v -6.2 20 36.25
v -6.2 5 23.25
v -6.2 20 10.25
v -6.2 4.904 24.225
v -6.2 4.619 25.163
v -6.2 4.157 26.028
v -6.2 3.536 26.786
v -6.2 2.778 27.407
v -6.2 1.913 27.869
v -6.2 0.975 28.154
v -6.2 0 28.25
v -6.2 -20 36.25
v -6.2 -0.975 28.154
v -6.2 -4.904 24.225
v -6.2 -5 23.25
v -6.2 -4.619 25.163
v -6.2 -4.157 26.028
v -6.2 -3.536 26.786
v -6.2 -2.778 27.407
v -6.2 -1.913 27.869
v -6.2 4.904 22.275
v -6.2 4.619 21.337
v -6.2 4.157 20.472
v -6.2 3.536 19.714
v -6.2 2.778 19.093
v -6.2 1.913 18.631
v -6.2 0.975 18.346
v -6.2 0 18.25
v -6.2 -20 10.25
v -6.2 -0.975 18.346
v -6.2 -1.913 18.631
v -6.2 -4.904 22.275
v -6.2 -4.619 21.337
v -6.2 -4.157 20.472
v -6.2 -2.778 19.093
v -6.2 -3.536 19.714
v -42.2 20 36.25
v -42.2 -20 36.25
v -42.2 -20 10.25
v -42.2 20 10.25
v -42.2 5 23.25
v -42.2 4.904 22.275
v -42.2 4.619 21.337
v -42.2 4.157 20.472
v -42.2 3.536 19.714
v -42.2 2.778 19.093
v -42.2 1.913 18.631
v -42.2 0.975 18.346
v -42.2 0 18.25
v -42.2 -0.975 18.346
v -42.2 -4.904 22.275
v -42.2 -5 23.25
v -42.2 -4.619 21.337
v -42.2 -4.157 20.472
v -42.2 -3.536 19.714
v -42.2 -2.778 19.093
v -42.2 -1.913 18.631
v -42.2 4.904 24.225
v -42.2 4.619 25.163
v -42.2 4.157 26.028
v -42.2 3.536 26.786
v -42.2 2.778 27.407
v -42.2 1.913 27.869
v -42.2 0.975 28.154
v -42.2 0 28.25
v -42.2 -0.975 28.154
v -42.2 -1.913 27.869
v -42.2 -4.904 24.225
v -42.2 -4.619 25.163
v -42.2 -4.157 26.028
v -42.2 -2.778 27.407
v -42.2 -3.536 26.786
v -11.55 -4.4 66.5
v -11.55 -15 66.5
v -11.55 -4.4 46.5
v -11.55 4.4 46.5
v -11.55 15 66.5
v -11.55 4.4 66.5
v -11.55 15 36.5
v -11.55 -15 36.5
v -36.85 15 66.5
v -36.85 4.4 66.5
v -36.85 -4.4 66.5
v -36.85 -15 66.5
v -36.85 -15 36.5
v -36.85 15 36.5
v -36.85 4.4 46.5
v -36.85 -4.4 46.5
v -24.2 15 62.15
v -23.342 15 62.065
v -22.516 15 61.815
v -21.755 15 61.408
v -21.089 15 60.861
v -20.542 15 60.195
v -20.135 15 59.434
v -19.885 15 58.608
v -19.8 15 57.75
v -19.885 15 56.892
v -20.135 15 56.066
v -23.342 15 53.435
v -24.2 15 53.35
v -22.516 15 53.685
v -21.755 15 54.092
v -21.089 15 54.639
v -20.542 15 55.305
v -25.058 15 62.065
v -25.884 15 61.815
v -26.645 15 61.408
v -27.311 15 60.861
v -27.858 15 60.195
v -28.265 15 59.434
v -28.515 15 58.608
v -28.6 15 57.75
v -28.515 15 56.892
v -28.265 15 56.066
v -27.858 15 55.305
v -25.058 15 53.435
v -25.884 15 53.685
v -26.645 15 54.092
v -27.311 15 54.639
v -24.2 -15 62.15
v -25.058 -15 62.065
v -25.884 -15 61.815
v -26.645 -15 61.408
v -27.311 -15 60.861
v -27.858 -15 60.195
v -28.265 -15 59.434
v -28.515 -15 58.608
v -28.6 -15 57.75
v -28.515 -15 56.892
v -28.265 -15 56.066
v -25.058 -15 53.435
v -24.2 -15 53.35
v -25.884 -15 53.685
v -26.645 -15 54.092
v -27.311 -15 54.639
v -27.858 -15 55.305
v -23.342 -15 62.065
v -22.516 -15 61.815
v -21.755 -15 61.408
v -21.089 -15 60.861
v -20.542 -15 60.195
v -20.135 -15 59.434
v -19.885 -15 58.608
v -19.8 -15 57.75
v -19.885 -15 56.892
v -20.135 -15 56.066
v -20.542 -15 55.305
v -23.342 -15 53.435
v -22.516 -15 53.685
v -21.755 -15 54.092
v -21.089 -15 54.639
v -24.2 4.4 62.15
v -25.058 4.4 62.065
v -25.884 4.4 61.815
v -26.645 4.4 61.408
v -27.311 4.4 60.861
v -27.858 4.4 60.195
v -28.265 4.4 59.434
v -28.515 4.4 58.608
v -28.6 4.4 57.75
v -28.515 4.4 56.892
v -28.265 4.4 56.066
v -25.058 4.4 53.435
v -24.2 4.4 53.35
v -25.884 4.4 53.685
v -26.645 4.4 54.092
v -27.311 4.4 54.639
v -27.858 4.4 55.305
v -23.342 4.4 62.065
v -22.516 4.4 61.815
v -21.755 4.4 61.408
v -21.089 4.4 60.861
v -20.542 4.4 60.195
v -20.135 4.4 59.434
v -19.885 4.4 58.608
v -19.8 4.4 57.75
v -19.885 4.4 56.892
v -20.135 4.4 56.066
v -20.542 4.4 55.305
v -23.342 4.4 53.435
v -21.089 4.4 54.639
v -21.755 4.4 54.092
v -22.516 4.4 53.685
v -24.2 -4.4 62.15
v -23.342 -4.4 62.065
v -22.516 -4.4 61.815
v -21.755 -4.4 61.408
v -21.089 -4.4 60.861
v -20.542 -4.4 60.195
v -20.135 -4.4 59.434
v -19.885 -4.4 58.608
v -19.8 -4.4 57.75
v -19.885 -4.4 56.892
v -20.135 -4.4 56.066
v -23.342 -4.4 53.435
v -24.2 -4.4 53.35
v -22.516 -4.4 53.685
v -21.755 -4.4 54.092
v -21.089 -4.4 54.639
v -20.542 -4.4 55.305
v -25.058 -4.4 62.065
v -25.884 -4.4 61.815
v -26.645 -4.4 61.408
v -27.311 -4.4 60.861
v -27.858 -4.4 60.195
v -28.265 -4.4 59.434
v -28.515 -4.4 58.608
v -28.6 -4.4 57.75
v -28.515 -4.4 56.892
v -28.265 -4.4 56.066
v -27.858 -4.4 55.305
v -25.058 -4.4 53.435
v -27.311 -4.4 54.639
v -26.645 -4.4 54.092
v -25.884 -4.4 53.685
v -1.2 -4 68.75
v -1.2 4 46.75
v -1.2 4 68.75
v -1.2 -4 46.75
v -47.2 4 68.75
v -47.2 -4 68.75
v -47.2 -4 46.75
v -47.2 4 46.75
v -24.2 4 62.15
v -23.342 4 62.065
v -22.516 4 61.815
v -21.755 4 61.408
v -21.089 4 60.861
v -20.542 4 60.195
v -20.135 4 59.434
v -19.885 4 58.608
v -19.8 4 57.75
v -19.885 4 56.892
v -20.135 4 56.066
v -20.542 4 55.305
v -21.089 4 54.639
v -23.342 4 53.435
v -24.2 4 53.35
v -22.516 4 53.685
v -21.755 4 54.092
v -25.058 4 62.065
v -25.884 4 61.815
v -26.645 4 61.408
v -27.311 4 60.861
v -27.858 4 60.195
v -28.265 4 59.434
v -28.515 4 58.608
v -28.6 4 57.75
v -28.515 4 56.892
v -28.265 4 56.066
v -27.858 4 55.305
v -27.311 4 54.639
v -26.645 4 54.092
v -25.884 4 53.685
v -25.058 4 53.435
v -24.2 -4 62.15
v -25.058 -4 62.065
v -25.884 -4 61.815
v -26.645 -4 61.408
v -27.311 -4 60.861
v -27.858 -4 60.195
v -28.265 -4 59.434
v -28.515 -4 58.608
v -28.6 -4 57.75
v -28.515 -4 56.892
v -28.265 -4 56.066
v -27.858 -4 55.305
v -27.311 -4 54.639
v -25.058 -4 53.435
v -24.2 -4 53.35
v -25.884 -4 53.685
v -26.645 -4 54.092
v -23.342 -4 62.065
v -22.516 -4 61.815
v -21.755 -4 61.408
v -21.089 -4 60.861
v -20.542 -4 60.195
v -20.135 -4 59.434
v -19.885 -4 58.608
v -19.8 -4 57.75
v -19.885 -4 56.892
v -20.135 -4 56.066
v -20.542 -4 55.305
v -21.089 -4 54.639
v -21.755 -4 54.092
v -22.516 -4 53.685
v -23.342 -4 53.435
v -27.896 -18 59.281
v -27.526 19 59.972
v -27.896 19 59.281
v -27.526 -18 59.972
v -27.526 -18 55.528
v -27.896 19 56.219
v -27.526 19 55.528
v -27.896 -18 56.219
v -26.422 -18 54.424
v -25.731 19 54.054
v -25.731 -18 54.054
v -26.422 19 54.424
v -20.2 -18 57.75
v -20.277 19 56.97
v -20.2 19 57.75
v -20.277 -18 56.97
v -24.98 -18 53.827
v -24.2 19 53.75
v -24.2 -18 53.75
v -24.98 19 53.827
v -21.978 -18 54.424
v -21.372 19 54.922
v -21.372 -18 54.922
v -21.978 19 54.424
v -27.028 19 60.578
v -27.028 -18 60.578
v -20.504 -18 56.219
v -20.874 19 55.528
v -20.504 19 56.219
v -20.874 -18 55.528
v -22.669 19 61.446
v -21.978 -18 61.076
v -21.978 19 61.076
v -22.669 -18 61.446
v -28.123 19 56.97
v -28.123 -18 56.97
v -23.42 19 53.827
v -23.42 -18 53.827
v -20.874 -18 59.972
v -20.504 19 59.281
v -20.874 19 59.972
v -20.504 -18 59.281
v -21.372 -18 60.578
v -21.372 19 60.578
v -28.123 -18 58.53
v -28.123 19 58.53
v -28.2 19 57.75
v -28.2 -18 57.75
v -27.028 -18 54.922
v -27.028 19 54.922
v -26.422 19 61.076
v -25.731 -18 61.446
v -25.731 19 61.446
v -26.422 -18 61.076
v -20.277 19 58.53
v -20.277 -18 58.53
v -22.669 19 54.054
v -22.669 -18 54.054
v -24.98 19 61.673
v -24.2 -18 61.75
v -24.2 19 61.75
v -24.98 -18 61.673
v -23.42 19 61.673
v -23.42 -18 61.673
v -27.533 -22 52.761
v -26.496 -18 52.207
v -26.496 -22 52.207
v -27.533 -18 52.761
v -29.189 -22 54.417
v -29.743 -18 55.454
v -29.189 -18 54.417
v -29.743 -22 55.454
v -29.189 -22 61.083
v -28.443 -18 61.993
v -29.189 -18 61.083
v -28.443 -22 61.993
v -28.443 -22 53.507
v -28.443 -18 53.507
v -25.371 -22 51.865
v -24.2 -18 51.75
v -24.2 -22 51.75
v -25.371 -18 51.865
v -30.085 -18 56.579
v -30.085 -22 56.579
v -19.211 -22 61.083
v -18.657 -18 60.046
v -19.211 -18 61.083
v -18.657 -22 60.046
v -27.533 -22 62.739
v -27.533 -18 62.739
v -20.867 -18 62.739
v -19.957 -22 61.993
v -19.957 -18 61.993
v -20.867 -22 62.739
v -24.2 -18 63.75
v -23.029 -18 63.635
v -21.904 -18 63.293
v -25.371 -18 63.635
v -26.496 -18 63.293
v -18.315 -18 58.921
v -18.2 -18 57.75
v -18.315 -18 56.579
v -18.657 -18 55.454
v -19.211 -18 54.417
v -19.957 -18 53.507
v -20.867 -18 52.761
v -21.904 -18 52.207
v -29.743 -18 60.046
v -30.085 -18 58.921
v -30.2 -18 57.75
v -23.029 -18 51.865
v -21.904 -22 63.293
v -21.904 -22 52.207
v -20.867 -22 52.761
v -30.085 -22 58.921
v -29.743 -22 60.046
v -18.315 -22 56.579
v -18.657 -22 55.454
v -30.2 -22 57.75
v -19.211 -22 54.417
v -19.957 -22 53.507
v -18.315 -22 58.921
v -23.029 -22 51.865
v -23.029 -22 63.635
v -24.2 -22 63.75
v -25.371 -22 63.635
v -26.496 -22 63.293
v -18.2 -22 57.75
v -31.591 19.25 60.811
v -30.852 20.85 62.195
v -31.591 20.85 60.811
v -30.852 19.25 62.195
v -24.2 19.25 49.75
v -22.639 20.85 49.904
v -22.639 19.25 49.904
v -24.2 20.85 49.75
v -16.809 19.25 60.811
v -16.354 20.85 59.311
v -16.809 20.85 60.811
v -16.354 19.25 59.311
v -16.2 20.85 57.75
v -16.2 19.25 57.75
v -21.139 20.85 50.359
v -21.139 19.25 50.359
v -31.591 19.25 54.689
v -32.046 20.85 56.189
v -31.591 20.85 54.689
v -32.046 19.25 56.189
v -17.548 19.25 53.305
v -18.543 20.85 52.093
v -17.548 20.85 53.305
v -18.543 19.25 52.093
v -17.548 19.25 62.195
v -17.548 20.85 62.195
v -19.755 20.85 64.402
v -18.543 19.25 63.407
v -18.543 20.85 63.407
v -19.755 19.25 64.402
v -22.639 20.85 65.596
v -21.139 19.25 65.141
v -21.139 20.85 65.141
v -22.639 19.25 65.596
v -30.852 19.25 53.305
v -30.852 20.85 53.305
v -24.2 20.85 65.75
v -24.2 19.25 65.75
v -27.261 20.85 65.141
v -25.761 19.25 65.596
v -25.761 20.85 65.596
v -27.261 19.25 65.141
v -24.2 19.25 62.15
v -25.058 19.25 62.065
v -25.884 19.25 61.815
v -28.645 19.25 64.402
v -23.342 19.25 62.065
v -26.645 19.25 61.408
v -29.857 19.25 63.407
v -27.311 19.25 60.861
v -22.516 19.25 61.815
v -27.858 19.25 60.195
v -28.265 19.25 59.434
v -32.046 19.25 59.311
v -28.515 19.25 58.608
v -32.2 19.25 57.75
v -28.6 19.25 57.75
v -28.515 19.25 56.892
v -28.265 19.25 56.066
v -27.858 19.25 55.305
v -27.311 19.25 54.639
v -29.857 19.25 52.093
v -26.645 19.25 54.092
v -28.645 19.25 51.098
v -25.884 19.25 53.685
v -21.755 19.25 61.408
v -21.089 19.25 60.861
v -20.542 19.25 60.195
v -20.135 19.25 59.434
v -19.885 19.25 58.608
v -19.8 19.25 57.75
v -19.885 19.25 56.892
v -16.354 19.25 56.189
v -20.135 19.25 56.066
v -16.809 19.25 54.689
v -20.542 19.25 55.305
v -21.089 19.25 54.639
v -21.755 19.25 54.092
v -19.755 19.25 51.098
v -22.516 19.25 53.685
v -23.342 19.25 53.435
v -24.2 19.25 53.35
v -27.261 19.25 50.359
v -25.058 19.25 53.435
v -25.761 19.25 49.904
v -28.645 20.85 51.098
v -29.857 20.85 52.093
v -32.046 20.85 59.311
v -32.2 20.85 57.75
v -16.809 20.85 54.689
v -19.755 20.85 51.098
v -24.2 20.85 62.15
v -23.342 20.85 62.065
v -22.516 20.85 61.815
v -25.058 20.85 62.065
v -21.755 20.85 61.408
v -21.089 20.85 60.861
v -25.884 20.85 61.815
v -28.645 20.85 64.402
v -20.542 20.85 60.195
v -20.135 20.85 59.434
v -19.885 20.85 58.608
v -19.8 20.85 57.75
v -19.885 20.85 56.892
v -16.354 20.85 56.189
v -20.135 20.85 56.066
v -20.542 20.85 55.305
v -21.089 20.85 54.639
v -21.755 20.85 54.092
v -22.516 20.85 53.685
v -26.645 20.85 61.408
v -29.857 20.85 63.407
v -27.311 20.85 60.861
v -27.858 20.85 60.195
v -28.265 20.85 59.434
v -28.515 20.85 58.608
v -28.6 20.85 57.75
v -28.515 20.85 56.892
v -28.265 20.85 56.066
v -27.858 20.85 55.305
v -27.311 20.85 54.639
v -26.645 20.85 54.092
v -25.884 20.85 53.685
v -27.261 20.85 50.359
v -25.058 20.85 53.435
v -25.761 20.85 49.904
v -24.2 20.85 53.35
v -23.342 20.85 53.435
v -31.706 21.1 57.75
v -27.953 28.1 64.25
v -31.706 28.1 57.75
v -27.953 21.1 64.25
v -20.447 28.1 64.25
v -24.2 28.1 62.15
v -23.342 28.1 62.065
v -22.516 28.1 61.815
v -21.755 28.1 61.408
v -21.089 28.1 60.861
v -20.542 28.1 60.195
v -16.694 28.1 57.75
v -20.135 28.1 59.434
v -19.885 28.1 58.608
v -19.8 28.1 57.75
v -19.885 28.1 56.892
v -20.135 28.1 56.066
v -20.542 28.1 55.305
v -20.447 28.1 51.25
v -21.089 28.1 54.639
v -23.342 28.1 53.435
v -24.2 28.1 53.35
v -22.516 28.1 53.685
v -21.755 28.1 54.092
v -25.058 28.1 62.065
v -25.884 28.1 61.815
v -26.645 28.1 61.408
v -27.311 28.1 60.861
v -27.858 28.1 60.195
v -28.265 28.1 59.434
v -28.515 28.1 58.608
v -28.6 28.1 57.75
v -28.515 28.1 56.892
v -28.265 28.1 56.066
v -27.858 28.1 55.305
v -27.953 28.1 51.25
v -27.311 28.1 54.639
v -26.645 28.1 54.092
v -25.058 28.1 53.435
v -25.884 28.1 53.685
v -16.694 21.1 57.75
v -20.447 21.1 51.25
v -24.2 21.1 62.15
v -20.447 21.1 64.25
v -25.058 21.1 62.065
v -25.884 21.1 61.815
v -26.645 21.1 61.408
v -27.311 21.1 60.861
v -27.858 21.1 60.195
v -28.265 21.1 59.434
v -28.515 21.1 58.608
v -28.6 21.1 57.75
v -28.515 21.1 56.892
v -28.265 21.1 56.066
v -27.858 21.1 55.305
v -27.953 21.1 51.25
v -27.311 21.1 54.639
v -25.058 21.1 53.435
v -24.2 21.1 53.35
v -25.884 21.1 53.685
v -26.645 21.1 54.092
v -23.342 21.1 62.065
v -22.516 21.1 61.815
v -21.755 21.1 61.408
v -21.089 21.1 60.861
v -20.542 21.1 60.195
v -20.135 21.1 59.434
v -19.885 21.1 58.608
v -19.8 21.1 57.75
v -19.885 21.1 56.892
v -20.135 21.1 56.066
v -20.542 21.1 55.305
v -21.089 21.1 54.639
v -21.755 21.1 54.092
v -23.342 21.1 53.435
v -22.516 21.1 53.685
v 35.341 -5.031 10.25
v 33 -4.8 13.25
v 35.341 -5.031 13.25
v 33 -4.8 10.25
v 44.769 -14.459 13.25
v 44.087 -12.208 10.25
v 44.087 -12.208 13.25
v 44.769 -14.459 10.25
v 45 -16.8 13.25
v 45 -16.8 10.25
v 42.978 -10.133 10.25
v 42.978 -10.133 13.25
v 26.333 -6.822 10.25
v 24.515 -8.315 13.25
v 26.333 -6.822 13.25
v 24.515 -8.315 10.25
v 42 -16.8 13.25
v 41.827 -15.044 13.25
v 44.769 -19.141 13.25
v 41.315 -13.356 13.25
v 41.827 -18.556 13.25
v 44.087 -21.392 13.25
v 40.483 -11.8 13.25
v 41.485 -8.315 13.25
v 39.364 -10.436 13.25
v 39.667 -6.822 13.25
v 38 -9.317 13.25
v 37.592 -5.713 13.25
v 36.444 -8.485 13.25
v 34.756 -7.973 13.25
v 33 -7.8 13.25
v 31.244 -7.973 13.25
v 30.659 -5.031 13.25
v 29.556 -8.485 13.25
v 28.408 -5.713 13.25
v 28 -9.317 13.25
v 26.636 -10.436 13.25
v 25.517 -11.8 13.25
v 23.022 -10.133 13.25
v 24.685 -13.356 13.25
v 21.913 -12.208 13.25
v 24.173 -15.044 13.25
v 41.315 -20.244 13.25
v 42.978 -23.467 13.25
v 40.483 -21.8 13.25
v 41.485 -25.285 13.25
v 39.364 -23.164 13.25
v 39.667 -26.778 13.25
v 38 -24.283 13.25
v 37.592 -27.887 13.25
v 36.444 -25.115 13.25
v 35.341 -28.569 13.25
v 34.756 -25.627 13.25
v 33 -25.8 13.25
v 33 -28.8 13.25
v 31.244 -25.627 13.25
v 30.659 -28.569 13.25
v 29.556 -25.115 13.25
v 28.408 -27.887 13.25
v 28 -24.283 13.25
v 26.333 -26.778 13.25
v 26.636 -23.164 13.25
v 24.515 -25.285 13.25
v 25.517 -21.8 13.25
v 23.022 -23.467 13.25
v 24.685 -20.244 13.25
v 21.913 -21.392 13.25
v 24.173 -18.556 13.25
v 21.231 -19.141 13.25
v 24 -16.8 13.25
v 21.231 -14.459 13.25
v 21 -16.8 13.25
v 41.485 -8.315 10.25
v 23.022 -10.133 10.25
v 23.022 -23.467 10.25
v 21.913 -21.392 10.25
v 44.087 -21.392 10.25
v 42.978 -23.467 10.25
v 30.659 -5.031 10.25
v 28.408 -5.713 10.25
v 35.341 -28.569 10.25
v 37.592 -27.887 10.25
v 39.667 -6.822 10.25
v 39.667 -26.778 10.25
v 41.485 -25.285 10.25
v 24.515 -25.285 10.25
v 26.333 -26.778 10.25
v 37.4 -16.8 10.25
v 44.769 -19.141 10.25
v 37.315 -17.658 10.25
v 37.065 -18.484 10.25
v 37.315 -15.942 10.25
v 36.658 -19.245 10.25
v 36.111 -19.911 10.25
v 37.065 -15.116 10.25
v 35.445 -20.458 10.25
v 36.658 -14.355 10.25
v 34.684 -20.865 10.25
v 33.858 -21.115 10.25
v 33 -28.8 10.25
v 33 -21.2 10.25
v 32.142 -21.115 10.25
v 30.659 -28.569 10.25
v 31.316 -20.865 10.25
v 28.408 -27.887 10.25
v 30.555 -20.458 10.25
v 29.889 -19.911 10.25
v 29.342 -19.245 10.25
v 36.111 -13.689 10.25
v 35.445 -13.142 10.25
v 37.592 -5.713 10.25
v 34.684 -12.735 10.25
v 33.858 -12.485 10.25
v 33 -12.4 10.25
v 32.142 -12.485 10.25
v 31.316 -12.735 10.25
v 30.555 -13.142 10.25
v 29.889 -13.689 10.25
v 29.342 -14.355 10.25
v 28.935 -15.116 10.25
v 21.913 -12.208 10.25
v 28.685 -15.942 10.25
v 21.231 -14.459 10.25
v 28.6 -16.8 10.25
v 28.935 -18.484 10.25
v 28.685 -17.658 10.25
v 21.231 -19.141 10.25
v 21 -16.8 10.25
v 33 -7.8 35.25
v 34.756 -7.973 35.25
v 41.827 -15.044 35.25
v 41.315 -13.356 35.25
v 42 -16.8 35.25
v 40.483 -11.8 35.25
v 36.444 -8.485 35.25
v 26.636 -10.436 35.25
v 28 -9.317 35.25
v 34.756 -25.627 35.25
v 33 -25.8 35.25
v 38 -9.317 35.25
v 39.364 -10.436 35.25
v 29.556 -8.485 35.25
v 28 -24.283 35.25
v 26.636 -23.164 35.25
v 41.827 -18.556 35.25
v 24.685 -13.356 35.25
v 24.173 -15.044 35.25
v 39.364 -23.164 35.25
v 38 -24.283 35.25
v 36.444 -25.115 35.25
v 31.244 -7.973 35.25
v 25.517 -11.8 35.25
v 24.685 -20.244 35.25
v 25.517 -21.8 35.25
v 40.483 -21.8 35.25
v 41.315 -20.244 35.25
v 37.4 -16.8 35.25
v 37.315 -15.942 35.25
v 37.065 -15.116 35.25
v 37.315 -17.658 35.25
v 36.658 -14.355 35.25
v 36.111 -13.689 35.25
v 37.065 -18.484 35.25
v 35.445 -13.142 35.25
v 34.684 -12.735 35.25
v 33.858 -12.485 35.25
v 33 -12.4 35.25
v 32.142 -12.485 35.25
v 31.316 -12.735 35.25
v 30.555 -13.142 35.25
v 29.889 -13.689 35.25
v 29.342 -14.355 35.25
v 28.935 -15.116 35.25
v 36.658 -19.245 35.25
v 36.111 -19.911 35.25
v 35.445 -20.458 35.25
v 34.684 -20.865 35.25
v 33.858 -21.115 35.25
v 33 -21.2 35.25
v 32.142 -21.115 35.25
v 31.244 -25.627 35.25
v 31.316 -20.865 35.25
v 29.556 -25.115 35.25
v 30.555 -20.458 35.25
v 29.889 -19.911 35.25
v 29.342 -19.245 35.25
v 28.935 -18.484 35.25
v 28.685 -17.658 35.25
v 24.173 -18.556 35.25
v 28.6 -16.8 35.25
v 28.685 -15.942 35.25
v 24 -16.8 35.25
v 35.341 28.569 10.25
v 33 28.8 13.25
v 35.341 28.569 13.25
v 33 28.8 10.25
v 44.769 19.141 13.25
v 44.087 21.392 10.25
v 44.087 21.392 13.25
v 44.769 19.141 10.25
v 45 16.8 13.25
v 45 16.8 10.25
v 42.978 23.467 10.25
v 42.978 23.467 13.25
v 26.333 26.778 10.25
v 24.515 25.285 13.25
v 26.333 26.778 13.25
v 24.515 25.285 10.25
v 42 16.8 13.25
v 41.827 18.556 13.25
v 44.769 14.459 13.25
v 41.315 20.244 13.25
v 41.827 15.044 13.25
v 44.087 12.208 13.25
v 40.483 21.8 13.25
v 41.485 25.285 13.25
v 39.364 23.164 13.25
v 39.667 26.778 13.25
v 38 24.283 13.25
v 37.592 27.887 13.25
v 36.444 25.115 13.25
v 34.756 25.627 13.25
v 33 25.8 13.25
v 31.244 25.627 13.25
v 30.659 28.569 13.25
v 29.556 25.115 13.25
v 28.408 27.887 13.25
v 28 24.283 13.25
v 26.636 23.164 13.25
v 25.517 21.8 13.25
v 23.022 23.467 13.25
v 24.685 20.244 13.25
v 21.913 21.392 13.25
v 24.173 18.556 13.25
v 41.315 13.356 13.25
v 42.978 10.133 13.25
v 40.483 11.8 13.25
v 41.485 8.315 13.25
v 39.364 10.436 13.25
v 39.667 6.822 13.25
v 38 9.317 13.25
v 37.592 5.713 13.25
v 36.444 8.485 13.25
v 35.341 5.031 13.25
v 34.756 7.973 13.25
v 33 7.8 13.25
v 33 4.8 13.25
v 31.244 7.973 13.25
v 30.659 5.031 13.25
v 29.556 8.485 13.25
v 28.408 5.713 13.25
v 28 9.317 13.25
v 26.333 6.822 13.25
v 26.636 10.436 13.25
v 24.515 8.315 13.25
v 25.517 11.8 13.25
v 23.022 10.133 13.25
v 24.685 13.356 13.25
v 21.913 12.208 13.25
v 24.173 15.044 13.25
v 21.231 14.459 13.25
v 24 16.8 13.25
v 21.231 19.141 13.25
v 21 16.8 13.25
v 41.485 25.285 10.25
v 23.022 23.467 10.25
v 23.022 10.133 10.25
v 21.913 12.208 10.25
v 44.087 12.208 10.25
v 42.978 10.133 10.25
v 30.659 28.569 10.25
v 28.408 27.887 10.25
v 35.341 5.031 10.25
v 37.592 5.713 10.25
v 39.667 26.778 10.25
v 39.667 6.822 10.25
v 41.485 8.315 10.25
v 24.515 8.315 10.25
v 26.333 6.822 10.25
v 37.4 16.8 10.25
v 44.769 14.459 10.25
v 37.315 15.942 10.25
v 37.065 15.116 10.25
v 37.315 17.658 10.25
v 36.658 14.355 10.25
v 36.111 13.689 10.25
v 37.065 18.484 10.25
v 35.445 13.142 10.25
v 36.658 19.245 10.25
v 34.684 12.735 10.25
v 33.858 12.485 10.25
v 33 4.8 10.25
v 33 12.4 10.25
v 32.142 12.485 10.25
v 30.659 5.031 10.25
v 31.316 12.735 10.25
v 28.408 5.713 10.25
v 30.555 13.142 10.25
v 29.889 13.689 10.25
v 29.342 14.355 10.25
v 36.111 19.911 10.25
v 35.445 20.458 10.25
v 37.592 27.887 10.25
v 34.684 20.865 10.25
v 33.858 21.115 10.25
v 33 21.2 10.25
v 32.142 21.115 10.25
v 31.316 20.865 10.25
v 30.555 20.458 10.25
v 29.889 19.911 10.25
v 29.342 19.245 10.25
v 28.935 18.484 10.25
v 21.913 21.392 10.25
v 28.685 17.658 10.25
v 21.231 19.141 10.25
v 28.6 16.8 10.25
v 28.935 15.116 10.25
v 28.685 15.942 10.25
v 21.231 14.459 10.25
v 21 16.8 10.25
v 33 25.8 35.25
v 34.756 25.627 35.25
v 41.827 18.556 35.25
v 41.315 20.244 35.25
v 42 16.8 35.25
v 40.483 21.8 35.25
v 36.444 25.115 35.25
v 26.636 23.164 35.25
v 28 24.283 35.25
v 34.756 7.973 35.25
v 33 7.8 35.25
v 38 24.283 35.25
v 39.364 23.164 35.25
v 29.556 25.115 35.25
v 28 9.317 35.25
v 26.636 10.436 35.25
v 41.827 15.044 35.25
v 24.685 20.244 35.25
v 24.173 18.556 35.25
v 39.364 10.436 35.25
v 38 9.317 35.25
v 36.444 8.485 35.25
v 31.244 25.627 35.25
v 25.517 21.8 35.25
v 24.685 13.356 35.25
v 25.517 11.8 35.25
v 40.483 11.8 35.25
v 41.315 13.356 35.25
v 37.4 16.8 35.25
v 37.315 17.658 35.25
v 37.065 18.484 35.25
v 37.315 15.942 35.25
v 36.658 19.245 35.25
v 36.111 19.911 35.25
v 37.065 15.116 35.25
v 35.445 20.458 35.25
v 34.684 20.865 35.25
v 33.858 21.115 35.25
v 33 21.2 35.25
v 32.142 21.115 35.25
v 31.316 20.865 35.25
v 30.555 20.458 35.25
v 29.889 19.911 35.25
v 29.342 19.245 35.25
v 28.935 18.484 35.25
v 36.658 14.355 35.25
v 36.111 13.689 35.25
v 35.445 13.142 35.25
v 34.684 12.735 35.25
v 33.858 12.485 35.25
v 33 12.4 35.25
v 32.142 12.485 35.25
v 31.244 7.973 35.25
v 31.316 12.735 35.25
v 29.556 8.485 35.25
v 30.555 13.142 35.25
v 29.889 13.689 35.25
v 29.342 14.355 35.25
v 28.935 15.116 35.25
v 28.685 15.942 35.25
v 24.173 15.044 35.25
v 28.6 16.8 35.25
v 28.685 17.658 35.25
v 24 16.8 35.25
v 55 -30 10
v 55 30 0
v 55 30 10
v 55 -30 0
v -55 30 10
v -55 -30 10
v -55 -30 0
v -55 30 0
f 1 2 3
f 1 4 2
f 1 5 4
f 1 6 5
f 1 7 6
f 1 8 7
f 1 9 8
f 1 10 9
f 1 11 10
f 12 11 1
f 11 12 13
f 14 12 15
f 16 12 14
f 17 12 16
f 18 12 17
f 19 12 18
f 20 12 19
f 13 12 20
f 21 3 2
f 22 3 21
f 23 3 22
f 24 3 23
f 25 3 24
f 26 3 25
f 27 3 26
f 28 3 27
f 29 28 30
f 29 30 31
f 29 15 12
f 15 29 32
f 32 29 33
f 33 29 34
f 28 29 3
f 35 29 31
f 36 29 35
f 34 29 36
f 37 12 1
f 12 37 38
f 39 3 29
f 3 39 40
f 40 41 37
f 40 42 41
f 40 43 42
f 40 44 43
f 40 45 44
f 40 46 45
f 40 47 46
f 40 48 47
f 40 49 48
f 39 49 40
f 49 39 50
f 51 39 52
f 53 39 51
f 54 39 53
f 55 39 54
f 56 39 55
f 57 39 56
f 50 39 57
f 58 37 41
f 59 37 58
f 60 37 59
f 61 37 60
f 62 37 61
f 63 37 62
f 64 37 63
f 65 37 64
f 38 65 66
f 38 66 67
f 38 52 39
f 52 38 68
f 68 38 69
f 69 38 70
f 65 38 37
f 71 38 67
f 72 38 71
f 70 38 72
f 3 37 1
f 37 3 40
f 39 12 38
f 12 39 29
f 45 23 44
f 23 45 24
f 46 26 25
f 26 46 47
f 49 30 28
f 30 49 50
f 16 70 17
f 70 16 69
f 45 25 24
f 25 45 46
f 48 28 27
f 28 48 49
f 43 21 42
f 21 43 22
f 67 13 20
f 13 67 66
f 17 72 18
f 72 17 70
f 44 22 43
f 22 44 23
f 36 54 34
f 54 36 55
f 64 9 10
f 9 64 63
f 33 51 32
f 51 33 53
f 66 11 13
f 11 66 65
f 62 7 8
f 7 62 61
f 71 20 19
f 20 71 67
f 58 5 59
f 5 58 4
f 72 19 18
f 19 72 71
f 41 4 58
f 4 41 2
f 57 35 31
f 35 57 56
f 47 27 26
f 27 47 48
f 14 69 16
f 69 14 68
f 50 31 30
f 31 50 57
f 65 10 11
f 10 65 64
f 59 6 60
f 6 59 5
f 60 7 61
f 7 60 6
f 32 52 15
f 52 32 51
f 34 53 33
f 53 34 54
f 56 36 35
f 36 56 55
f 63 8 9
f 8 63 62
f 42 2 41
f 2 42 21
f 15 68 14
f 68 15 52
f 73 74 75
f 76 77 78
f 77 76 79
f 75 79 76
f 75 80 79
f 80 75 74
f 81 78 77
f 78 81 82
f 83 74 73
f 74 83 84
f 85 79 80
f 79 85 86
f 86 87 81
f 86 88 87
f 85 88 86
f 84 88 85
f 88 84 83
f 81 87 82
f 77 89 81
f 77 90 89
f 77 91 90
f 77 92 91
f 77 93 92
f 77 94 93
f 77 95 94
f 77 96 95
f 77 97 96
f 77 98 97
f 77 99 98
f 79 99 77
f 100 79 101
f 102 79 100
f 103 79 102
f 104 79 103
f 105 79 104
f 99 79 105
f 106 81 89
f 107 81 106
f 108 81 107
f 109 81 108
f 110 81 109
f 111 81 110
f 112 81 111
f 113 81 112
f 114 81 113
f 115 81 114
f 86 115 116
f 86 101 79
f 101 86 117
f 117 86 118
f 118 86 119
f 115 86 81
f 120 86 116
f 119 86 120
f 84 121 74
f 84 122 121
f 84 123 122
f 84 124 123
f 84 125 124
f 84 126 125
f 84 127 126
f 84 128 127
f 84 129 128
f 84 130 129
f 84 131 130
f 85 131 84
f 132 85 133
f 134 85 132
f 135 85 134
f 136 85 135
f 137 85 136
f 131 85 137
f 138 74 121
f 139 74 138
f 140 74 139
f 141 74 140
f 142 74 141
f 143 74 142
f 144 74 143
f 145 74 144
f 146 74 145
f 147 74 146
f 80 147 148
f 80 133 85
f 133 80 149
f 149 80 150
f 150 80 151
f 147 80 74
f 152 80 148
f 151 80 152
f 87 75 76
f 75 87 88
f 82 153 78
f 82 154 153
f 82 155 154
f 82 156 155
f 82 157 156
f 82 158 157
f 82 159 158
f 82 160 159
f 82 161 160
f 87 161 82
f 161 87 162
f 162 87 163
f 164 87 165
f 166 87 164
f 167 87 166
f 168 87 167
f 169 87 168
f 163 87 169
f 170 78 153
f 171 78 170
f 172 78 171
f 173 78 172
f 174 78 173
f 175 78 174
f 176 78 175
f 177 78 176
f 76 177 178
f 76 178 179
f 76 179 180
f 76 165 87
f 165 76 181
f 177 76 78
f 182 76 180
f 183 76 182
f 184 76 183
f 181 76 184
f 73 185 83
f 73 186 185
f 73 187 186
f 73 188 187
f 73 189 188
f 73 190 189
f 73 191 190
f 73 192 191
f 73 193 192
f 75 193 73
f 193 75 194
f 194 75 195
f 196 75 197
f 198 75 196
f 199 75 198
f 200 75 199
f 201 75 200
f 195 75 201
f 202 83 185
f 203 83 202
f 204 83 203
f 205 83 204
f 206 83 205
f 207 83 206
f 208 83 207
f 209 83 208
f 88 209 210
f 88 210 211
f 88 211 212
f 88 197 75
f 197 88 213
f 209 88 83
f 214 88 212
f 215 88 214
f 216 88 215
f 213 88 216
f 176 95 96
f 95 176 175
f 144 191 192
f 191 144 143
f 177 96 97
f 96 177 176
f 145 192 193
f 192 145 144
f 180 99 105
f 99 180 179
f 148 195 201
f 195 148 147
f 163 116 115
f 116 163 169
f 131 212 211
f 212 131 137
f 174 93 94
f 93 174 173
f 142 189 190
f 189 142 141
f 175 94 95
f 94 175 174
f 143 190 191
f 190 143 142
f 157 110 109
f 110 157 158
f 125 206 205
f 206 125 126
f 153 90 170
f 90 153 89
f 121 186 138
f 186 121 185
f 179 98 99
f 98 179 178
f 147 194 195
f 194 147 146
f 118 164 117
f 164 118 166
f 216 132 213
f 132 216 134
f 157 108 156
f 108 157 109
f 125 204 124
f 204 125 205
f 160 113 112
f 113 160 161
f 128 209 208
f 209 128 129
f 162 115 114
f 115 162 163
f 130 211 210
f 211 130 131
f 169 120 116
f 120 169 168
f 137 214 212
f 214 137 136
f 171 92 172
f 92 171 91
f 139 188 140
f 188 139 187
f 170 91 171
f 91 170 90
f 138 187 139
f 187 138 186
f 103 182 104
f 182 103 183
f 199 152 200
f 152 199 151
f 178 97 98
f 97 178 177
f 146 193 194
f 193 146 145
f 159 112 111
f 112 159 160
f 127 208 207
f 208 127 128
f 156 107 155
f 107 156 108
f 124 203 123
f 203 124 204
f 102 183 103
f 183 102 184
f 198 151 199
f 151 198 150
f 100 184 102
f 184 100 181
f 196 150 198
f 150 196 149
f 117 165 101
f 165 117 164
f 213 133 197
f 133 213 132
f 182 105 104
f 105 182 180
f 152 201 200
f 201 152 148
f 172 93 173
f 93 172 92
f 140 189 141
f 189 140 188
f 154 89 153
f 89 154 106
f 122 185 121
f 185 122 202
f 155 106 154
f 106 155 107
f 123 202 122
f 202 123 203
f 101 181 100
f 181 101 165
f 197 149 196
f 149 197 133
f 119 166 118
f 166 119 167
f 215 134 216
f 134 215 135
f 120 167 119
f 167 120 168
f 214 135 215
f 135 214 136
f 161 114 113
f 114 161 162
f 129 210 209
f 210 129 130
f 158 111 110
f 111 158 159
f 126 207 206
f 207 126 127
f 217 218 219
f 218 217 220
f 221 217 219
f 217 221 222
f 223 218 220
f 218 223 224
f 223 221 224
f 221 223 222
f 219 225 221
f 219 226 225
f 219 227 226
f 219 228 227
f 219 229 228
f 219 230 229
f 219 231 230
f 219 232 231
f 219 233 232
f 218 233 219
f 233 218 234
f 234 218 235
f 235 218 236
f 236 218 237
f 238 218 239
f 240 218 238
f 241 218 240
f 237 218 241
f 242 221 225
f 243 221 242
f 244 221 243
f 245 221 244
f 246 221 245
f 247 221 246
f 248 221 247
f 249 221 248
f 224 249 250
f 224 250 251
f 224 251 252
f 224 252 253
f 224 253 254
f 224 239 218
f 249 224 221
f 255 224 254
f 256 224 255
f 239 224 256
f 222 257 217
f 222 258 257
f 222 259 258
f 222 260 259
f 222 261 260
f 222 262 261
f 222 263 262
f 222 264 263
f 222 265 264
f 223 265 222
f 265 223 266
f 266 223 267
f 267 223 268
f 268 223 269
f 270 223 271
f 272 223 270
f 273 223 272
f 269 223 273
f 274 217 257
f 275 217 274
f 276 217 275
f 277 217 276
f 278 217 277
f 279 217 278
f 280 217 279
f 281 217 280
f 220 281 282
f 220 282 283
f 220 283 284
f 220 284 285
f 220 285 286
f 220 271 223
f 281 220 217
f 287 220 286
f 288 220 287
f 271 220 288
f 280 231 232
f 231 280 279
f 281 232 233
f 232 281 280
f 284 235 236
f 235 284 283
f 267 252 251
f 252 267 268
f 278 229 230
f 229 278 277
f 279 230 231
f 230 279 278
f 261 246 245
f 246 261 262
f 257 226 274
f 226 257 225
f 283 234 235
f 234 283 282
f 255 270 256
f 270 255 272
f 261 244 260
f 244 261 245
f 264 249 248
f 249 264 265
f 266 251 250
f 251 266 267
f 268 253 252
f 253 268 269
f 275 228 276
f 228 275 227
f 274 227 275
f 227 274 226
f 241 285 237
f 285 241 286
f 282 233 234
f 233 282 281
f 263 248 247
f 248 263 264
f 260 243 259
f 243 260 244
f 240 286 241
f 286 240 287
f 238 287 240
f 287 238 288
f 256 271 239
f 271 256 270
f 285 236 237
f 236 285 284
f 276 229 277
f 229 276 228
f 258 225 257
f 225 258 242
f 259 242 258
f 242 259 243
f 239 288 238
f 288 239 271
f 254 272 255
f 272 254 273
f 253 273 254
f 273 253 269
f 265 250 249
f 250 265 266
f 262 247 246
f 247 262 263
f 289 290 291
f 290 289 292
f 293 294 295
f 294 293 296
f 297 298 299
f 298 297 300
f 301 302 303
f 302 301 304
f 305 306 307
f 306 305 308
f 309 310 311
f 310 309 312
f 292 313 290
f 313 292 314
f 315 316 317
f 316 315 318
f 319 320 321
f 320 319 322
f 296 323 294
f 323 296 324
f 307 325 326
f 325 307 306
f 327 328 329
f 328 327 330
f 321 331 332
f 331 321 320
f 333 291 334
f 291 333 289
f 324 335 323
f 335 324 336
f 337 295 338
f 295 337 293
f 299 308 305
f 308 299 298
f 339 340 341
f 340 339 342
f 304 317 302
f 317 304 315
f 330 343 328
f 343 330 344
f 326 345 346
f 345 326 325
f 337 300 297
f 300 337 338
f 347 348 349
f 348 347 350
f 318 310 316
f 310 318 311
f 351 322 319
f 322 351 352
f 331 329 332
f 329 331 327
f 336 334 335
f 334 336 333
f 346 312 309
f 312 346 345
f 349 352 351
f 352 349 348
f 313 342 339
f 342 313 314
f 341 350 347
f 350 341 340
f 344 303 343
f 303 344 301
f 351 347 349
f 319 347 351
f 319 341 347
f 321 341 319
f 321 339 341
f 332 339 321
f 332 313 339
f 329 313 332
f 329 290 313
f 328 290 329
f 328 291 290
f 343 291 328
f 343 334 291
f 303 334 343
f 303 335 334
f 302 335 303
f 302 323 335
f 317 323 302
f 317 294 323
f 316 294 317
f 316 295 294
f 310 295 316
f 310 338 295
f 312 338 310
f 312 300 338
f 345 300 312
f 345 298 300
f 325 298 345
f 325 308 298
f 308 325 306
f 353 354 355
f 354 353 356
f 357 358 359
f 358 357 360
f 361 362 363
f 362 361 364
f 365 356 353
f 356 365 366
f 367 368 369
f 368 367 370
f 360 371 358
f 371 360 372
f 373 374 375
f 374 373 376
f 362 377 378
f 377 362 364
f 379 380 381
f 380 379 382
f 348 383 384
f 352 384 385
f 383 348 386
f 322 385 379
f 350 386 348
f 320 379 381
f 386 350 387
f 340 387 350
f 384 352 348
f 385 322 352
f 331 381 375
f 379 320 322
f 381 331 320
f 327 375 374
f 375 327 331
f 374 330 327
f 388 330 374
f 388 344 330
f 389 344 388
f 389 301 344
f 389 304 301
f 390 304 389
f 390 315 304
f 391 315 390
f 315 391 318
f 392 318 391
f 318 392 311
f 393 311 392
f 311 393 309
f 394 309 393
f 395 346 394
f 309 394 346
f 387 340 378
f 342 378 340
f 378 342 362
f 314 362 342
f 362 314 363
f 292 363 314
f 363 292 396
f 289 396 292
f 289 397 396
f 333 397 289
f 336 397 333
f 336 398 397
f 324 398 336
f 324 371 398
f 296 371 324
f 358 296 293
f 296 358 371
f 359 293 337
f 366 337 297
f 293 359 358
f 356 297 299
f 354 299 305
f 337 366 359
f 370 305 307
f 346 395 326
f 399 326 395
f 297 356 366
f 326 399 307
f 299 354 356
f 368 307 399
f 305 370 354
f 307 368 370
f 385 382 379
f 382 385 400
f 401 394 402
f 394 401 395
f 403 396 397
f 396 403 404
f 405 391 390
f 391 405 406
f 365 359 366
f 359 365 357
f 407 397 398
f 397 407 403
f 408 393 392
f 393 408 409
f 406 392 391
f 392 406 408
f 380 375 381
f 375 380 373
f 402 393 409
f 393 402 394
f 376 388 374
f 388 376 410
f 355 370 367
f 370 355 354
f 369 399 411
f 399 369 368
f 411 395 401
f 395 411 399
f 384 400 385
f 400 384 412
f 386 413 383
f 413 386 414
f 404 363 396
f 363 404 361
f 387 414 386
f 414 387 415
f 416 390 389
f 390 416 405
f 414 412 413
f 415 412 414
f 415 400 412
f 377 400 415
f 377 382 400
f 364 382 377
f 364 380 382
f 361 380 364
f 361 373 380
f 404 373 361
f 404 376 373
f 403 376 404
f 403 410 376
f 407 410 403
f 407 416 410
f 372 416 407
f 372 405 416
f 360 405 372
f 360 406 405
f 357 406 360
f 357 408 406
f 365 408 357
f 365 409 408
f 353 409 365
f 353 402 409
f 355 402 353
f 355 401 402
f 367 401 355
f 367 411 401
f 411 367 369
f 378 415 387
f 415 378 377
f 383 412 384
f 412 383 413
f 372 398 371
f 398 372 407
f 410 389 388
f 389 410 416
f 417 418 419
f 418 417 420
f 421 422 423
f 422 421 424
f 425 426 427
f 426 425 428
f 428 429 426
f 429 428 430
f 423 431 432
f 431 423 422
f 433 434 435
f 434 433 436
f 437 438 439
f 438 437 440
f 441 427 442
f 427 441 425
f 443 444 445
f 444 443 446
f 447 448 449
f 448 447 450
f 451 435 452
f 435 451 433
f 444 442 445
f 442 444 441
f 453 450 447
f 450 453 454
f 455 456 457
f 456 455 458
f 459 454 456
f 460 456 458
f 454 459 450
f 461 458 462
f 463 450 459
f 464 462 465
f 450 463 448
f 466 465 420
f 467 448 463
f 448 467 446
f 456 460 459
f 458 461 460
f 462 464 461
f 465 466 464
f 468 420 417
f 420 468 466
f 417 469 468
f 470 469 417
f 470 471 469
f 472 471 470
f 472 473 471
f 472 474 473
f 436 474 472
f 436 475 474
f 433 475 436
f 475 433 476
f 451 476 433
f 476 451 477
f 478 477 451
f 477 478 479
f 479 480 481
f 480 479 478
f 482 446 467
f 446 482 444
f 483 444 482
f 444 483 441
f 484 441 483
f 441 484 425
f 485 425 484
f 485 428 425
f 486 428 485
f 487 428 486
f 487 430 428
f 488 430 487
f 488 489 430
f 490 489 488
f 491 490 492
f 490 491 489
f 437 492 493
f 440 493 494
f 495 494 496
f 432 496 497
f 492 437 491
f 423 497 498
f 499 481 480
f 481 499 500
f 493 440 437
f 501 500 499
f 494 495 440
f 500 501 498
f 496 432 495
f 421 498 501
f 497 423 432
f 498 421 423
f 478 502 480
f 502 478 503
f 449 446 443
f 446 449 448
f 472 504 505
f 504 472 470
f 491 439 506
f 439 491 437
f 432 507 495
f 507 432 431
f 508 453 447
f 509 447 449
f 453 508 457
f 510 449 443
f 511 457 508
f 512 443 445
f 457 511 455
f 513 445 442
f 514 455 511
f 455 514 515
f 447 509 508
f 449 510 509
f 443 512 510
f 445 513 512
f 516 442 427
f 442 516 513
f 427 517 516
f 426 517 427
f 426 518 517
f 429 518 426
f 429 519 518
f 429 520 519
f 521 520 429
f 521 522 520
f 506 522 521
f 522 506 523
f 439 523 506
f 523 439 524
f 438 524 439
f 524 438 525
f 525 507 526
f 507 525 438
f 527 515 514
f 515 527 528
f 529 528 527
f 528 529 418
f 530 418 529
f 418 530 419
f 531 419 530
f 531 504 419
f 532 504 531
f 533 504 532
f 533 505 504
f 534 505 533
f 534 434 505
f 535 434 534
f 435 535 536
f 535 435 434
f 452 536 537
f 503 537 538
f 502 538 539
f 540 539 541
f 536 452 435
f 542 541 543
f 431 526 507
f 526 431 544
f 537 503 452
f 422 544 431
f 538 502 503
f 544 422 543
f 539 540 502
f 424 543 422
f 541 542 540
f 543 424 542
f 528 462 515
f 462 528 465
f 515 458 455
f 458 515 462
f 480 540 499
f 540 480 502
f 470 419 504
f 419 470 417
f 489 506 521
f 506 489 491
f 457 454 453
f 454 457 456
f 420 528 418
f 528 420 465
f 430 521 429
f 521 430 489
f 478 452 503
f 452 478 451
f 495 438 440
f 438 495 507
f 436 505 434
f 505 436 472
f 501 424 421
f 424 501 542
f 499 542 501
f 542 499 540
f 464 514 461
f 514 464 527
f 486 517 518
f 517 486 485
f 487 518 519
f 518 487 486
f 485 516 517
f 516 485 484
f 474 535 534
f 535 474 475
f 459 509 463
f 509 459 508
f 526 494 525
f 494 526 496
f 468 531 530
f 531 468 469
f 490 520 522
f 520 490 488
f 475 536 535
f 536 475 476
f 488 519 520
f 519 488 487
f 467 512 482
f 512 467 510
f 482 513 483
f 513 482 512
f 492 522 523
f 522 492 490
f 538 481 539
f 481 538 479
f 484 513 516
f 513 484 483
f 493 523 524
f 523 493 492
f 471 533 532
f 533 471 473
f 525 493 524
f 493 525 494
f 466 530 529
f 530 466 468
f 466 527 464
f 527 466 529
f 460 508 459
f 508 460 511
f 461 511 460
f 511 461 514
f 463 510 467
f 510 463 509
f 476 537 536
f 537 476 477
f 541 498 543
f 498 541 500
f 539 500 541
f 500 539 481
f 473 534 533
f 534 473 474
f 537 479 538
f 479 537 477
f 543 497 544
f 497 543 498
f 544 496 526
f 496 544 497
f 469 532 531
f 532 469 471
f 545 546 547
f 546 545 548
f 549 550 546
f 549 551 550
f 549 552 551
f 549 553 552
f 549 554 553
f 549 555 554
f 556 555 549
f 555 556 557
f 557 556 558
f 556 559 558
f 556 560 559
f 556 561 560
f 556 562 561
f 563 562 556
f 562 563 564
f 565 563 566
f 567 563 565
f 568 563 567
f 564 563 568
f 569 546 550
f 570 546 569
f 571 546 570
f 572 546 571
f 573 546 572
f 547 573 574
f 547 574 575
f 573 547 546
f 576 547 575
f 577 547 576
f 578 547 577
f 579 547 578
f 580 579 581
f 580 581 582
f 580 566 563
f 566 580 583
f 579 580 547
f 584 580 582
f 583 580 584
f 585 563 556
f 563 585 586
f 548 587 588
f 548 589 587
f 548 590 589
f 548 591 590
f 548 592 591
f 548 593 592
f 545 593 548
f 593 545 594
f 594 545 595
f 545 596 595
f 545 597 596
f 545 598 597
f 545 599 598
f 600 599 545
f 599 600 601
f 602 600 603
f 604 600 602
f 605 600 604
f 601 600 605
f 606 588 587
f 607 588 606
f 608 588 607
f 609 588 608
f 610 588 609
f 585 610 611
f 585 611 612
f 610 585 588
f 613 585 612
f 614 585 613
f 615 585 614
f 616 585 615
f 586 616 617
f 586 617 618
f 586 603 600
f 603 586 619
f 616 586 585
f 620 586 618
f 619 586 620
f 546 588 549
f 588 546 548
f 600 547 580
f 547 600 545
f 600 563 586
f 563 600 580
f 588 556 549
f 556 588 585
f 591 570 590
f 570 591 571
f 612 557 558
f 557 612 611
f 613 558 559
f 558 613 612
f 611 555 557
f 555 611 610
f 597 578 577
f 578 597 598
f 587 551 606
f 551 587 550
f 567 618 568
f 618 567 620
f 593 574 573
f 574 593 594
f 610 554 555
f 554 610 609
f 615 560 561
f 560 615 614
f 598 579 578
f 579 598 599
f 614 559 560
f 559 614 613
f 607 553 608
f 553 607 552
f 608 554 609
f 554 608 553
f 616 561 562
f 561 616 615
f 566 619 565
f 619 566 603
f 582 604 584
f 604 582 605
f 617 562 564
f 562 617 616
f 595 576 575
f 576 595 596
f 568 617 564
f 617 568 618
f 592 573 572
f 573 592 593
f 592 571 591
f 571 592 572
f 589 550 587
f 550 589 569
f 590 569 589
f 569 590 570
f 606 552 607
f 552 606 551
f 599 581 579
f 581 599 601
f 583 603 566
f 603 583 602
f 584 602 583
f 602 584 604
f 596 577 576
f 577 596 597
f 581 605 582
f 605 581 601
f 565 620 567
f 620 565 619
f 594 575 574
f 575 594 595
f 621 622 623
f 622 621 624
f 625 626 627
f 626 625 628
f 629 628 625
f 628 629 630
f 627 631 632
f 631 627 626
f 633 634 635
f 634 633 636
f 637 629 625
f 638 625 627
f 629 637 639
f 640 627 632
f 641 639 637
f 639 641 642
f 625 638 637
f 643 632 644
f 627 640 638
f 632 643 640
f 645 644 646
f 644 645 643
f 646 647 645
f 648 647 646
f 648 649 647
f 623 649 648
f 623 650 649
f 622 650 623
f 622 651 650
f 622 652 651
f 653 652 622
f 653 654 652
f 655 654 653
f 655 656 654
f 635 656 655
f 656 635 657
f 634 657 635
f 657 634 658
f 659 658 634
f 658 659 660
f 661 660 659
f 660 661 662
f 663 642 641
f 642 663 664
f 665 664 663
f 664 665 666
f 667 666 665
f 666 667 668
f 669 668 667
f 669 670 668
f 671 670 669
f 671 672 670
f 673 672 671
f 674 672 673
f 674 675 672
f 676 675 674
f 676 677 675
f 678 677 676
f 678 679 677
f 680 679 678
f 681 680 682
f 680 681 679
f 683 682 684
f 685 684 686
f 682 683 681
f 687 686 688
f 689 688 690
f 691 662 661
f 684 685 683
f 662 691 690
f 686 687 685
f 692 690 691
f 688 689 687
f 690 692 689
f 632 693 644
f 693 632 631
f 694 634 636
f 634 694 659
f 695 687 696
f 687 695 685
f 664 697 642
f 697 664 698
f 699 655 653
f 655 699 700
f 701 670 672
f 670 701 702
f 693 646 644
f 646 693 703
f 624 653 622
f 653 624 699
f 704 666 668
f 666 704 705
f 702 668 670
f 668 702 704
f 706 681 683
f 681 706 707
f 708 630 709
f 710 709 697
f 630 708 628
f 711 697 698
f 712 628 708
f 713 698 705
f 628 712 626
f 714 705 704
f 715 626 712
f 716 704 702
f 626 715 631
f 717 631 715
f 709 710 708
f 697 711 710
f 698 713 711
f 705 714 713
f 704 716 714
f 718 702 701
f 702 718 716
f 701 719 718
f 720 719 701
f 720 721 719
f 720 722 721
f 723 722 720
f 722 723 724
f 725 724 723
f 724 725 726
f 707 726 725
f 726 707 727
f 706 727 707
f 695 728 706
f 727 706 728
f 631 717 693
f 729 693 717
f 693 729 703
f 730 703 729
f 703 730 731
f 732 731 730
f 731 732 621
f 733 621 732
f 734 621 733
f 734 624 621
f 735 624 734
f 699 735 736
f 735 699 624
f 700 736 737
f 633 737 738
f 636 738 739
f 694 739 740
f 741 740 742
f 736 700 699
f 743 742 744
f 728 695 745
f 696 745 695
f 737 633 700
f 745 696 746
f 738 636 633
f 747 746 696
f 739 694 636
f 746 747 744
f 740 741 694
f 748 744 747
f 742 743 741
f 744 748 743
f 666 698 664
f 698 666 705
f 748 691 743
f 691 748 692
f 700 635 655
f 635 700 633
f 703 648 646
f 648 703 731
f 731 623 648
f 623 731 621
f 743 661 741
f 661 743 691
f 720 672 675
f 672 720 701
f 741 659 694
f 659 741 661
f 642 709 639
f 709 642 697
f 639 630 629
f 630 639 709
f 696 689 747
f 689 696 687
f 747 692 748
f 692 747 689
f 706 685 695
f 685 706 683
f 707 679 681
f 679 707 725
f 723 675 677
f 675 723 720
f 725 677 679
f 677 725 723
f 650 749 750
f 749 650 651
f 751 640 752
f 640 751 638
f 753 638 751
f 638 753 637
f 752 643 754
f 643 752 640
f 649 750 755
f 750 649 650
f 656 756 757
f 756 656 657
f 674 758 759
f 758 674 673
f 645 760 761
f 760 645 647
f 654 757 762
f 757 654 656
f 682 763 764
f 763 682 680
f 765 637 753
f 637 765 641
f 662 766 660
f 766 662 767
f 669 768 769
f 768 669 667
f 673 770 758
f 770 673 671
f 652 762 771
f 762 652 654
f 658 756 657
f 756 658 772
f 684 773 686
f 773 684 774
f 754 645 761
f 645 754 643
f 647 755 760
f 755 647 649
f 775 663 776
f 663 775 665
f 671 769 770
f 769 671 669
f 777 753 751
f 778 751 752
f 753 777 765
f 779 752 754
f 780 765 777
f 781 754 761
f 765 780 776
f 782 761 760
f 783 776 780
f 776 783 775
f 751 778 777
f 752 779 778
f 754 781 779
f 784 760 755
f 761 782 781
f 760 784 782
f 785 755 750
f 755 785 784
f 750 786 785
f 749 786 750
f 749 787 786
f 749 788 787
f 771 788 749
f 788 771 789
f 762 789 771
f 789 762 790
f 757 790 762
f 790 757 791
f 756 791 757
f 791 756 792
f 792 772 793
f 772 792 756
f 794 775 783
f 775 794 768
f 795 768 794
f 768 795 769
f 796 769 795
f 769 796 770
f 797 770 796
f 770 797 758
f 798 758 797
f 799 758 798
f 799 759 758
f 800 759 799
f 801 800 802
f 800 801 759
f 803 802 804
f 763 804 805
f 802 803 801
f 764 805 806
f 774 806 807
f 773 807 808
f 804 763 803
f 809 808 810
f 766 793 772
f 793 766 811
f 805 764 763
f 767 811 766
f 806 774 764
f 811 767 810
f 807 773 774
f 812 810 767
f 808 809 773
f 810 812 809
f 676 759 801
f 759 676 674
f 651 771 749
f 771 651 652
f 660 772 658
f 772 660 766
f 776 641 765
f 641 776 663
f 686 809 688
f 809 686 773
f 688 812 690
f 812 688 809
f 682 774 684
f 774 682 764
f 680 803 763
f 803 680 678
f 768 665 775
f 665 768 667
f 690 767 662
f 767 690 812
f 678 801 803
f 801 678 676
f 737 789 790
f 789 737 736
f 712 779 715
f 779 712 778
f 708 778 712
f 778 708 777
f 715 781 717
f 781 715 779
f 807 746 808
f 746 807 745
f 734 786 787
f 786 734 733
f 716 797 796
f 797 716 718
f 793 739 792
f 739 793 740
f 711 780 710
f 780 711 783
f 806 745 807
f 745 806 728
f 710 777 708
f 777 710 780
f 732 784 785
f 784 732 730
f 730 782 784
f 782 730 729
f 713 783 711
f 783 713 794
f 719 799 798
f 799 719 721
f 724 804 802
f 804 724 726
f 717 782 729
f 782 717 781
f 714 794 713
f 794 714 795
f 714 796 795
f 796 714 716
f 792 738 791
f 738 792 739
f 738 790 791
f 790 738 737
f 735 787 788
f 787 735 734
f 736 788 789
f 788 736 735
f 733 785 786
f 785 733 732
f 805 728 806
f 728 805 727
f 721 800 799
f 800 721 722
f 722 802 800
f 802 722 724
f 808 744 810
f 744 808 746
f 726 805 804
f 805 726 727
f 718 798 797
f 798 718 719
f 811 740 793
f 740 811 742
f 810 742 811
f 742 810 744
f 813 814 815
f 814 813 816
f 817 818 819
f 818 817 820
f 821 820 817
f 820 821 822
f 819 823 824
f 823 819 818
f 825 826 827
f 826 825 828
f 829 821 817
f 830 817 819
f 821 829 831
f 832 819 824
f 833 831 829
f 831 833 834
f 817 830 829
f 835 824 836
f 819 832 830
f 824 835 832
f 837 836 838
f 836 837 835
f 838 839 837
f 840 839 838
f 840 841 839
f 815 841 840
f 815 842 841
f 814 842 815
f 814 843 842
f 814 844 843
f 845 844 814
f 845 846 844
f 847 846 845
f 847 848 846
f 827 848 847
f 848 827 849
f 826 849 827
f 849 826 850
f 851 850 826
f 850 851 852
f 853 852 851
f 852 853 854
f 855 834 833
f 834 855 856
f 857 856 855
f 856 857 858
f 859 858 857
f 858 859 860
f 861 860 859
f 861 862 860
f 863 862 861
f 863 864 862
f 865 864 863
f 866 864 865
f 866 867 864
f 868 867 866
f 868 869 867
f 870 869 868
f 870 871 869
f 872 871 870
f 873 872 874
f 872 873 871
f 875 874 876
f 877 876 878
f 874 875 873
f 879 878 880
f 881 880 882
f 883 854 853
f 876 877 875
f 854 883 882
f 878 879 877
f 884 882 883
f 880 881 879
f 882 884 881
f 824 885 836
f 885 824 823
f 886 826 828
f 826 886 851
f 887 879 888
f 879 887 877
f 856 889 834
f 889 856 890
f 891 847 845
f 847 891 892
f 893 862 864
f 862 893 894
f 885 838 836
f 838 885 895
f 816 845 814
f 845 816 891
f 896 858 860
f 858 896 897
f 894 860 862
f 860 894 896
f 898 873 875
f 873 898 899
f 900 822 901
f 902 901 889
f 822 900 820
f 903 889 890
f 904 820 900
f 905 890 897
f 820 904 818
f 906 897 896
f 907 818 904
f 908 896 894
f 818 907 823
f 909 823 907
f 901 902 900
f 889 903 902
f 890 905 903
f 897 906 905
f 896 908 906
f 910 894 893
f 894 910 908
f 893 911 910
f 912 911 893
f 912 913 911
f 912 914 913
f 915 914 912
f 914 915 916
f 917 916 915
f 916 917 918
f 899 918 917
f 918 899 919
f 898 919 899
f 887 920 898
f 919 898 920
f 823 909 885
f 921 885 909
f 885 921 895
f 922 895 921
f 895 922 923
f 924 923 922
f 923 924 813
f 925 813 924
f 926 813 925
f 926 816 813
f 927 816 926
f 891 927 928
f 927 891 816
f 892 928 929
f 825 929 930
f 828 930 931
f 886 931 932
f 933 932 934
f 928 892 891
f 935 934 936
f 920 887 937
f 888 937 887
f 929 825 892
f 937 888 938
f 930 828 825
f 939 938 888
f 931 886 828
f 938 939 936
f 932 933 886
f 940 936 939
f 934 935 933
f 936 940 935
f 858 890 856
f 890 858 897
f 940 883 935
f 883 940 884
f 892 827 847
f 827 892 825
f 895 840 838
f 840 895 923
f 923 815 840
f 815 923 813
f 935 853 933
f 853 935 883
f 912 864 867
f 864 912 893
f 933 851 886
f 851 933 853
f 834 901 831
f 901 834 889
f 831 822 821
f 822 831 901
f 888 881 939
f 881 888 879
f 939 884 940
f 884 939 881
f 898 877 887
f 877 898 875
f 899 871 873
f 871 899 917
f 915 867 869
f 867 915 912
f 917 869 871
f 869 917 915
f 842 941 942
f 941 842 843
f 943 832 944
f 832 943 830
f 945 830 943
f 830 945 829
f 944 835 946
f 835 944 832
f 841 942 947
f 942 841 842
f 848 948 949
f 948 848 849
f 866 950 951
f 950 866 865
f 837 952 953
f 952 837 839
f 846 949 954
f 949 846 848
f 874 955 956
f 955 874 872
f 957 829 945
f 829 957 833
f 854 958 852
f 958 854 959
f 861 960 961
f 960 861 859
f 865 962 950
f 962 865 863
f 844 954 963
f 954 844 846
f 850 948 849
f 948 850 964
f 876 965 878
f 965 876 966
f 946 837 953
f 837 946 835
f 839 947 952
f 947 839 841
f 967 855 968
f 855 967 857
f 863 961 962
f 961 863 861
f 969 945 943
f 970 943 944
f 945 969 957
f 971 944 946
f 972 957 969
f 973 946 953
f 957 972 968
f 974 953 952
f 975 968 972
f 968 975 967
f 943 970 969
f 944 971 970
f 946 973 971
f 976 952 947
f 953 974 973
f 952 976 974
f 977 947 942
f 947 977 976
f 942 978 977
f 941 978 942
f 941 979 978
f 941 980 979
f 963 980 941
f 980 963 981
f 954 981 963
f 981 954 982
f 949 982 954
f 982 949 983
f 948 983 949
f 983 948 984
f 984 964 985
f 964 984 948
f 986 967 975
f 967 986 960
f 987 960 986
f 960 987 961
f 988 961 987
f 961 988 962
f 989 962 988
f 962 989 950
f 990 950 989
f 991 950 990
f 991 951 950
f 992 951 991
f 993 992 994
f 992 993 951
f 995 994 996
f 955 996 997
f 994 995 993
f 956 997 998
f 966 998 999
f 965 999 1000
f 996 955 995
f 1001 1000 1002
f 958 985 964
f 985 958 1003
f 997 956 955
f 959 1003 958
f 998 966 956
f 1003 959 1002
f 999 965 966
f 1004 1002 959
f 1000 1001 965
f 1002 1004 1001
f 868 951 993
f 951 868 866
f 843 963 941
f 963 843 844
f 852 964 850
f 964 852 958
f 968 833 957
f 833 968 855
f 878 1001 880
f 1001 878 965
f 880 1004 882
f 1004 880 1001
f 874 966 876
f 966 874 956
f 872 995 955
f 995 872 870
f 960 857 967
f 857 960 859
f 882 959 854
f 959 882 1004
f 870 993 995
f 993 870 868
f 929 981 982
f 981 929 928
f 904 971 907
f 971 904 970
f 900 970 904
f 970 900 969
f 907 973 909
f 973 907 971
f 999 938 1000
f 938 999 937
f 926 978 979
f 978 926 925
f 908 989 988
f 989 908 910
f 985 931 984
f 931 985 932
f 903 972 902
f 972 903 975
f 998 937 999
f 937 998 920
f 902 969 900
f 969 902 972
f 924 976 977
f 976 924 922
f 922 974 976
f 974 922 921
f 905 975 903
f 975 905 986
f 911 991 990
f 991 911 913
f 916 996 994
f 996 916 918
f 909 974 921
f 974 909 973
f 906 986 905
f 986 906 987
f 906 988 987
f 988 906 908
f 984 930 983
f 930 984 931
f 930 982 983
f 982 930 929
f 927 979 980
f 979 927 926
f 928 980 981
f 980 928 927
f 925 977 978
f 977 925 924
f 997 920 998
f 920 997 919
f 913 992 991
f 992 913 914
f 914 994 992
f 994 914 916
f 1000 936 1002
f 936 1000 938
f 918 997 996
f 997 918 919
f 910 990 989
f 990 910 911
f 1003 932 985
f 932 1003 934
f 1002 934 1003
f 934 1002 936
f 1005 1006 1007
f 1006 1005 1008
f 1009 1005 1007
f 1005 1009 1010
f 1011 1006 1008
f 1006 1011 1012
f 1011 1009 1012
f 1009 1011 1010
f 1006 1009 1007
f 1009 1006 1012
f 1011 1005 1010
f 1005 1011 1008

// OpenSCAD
$fn = 32;

// ------------------------------------------------------------------------
// Indexing jig: plate 110 x 60 mm, pin d8
// Every part is its own module, assembly() places every instance.
// ------------------------------------------------------------------------

// --- part 1 ---
module jig_plate() {
  difference() {
    translate([-55, -30, 0]) cube([110, 60, 10]);
  }
}

// --- part 2 ---
module locator_block() {
  difference() {
    translate([-18, -20, 0]) cube([36, 40, 26]);
    translate([0, 0, 13]) rotate([0, 90, 0]) cylinder(h = 38, d = 10, center = true);
  }
}

// --- part 3 ---
module index_fork() {
  difference() {
    translate([-12.65, -15, 0]) cube([25.3, 30, 30]);
    translate([-13.65, -4.4, 10]) cube([27.3, 8.8, 21]);
    translate([0, 0, 21.25]) rotate([90, 0, 0]) cylinder(h = 32, d = 8.8, center = true);
  }
}

// --- part 4 ---
module index_arm() {
  difference() {
    translate([-23, -4, 0]) cube([46, 8, 22]);
    translate([0, 0, 11]) rotate([90, 0, 0]) cylinder(h = 10, d = 8.8, center = true);
  }
}

// --- part 5 ---
module index_pin() {
  rotate([0, 90, 0]) cylinder(h = 38, d = 8, center = true);
  translate([-22, 0, 0]) rotate([0, 90, 0]) cylinder(h = 4, d = 12);
}

// --- part 6 ---
module pin_washer() {
  difference() {
      translate([0, 0, 0]) cylinder(h = 1.6, d = 16);
      translate([0, 0, -1]) cylinder(h = 3.6, d = 8.8);
    }
}

// --- part 7 ---
module lock_nut() {
  difference() {
    linear_extrude(height = 7) polygon(points = [[7.506, 0], [3.753, 6.5], [-3.753, 6.5], [-7.506, 0], [-3.753, -6.5], [3.753, -6.5]]);
    translate([0, 0, -1]) cylinder(h = 9, d = 8.8);
  }
}

// --- part 8 ---
module guide_bush_a() {
  difference() {
    union() {
      cylinder(h = 3, d = 24);
      translate([0, 0, 3]) cylinder(h = 22, d = 18);
    }
    translate([0, 0, -1]) cylinder(h = 27, d = 8.8);
  }
}

// --- part 9 ---
module guide_bush_b() {
  difference() {
    union() {
      cylinder(h = 3, d = 24);
      translate([0, 0, 3]) cylinder(h = 22, d = 18);
    }
    translate([0, 0, -1]) cylinder(h = 27, d = 8.8);
  }
}

// --- assembly ---
module assembly() {
  color([0.80, 0.24, 0.20]) translate([0, 0, 0]) rotate([0, 0, 0]) jig_plate();
  color([0.20, 0.45, 0.75]) translate([-24.2, 0, 10.25]) rotate([0, 0, 0]) locator_block();
  color([0.25, 0.62, 0.32]) translate([-24.2, 0, 36.5]) rotate([0, 0, 0]) index_fork();
  color([0.92, 0.70, 0.18]) translate([-24.2, 0, 46.75]) rotate([0, 0, 0]) index_arm();
  color([0.58, 0.35, 0.70]) translate([-24.2, 0, 57.75]) rotate([0, 0, 90]) index_pin();
  color([0.16, 0.66, 0.66]) translate([-24.2, 20.85, 57.75]) rotate([90, 0, 0]) pin_washer();
  color([0.85, 0.48, 0.18]) translate([-24.2, 28.1, 57.75]) rotate([90, 0, 0]) lock_nut();
  color([0.55, 0.60, 0.65]) translate([33, -16.8, 10.25]) rotate([0, 0, 0]) guide_bush_a();
  color([0.75, 0.30, 0.55]) translate([33, 16.8, 10.25]) rotate([0, 0, 0]) guide_bush_b();
}

assembly();
